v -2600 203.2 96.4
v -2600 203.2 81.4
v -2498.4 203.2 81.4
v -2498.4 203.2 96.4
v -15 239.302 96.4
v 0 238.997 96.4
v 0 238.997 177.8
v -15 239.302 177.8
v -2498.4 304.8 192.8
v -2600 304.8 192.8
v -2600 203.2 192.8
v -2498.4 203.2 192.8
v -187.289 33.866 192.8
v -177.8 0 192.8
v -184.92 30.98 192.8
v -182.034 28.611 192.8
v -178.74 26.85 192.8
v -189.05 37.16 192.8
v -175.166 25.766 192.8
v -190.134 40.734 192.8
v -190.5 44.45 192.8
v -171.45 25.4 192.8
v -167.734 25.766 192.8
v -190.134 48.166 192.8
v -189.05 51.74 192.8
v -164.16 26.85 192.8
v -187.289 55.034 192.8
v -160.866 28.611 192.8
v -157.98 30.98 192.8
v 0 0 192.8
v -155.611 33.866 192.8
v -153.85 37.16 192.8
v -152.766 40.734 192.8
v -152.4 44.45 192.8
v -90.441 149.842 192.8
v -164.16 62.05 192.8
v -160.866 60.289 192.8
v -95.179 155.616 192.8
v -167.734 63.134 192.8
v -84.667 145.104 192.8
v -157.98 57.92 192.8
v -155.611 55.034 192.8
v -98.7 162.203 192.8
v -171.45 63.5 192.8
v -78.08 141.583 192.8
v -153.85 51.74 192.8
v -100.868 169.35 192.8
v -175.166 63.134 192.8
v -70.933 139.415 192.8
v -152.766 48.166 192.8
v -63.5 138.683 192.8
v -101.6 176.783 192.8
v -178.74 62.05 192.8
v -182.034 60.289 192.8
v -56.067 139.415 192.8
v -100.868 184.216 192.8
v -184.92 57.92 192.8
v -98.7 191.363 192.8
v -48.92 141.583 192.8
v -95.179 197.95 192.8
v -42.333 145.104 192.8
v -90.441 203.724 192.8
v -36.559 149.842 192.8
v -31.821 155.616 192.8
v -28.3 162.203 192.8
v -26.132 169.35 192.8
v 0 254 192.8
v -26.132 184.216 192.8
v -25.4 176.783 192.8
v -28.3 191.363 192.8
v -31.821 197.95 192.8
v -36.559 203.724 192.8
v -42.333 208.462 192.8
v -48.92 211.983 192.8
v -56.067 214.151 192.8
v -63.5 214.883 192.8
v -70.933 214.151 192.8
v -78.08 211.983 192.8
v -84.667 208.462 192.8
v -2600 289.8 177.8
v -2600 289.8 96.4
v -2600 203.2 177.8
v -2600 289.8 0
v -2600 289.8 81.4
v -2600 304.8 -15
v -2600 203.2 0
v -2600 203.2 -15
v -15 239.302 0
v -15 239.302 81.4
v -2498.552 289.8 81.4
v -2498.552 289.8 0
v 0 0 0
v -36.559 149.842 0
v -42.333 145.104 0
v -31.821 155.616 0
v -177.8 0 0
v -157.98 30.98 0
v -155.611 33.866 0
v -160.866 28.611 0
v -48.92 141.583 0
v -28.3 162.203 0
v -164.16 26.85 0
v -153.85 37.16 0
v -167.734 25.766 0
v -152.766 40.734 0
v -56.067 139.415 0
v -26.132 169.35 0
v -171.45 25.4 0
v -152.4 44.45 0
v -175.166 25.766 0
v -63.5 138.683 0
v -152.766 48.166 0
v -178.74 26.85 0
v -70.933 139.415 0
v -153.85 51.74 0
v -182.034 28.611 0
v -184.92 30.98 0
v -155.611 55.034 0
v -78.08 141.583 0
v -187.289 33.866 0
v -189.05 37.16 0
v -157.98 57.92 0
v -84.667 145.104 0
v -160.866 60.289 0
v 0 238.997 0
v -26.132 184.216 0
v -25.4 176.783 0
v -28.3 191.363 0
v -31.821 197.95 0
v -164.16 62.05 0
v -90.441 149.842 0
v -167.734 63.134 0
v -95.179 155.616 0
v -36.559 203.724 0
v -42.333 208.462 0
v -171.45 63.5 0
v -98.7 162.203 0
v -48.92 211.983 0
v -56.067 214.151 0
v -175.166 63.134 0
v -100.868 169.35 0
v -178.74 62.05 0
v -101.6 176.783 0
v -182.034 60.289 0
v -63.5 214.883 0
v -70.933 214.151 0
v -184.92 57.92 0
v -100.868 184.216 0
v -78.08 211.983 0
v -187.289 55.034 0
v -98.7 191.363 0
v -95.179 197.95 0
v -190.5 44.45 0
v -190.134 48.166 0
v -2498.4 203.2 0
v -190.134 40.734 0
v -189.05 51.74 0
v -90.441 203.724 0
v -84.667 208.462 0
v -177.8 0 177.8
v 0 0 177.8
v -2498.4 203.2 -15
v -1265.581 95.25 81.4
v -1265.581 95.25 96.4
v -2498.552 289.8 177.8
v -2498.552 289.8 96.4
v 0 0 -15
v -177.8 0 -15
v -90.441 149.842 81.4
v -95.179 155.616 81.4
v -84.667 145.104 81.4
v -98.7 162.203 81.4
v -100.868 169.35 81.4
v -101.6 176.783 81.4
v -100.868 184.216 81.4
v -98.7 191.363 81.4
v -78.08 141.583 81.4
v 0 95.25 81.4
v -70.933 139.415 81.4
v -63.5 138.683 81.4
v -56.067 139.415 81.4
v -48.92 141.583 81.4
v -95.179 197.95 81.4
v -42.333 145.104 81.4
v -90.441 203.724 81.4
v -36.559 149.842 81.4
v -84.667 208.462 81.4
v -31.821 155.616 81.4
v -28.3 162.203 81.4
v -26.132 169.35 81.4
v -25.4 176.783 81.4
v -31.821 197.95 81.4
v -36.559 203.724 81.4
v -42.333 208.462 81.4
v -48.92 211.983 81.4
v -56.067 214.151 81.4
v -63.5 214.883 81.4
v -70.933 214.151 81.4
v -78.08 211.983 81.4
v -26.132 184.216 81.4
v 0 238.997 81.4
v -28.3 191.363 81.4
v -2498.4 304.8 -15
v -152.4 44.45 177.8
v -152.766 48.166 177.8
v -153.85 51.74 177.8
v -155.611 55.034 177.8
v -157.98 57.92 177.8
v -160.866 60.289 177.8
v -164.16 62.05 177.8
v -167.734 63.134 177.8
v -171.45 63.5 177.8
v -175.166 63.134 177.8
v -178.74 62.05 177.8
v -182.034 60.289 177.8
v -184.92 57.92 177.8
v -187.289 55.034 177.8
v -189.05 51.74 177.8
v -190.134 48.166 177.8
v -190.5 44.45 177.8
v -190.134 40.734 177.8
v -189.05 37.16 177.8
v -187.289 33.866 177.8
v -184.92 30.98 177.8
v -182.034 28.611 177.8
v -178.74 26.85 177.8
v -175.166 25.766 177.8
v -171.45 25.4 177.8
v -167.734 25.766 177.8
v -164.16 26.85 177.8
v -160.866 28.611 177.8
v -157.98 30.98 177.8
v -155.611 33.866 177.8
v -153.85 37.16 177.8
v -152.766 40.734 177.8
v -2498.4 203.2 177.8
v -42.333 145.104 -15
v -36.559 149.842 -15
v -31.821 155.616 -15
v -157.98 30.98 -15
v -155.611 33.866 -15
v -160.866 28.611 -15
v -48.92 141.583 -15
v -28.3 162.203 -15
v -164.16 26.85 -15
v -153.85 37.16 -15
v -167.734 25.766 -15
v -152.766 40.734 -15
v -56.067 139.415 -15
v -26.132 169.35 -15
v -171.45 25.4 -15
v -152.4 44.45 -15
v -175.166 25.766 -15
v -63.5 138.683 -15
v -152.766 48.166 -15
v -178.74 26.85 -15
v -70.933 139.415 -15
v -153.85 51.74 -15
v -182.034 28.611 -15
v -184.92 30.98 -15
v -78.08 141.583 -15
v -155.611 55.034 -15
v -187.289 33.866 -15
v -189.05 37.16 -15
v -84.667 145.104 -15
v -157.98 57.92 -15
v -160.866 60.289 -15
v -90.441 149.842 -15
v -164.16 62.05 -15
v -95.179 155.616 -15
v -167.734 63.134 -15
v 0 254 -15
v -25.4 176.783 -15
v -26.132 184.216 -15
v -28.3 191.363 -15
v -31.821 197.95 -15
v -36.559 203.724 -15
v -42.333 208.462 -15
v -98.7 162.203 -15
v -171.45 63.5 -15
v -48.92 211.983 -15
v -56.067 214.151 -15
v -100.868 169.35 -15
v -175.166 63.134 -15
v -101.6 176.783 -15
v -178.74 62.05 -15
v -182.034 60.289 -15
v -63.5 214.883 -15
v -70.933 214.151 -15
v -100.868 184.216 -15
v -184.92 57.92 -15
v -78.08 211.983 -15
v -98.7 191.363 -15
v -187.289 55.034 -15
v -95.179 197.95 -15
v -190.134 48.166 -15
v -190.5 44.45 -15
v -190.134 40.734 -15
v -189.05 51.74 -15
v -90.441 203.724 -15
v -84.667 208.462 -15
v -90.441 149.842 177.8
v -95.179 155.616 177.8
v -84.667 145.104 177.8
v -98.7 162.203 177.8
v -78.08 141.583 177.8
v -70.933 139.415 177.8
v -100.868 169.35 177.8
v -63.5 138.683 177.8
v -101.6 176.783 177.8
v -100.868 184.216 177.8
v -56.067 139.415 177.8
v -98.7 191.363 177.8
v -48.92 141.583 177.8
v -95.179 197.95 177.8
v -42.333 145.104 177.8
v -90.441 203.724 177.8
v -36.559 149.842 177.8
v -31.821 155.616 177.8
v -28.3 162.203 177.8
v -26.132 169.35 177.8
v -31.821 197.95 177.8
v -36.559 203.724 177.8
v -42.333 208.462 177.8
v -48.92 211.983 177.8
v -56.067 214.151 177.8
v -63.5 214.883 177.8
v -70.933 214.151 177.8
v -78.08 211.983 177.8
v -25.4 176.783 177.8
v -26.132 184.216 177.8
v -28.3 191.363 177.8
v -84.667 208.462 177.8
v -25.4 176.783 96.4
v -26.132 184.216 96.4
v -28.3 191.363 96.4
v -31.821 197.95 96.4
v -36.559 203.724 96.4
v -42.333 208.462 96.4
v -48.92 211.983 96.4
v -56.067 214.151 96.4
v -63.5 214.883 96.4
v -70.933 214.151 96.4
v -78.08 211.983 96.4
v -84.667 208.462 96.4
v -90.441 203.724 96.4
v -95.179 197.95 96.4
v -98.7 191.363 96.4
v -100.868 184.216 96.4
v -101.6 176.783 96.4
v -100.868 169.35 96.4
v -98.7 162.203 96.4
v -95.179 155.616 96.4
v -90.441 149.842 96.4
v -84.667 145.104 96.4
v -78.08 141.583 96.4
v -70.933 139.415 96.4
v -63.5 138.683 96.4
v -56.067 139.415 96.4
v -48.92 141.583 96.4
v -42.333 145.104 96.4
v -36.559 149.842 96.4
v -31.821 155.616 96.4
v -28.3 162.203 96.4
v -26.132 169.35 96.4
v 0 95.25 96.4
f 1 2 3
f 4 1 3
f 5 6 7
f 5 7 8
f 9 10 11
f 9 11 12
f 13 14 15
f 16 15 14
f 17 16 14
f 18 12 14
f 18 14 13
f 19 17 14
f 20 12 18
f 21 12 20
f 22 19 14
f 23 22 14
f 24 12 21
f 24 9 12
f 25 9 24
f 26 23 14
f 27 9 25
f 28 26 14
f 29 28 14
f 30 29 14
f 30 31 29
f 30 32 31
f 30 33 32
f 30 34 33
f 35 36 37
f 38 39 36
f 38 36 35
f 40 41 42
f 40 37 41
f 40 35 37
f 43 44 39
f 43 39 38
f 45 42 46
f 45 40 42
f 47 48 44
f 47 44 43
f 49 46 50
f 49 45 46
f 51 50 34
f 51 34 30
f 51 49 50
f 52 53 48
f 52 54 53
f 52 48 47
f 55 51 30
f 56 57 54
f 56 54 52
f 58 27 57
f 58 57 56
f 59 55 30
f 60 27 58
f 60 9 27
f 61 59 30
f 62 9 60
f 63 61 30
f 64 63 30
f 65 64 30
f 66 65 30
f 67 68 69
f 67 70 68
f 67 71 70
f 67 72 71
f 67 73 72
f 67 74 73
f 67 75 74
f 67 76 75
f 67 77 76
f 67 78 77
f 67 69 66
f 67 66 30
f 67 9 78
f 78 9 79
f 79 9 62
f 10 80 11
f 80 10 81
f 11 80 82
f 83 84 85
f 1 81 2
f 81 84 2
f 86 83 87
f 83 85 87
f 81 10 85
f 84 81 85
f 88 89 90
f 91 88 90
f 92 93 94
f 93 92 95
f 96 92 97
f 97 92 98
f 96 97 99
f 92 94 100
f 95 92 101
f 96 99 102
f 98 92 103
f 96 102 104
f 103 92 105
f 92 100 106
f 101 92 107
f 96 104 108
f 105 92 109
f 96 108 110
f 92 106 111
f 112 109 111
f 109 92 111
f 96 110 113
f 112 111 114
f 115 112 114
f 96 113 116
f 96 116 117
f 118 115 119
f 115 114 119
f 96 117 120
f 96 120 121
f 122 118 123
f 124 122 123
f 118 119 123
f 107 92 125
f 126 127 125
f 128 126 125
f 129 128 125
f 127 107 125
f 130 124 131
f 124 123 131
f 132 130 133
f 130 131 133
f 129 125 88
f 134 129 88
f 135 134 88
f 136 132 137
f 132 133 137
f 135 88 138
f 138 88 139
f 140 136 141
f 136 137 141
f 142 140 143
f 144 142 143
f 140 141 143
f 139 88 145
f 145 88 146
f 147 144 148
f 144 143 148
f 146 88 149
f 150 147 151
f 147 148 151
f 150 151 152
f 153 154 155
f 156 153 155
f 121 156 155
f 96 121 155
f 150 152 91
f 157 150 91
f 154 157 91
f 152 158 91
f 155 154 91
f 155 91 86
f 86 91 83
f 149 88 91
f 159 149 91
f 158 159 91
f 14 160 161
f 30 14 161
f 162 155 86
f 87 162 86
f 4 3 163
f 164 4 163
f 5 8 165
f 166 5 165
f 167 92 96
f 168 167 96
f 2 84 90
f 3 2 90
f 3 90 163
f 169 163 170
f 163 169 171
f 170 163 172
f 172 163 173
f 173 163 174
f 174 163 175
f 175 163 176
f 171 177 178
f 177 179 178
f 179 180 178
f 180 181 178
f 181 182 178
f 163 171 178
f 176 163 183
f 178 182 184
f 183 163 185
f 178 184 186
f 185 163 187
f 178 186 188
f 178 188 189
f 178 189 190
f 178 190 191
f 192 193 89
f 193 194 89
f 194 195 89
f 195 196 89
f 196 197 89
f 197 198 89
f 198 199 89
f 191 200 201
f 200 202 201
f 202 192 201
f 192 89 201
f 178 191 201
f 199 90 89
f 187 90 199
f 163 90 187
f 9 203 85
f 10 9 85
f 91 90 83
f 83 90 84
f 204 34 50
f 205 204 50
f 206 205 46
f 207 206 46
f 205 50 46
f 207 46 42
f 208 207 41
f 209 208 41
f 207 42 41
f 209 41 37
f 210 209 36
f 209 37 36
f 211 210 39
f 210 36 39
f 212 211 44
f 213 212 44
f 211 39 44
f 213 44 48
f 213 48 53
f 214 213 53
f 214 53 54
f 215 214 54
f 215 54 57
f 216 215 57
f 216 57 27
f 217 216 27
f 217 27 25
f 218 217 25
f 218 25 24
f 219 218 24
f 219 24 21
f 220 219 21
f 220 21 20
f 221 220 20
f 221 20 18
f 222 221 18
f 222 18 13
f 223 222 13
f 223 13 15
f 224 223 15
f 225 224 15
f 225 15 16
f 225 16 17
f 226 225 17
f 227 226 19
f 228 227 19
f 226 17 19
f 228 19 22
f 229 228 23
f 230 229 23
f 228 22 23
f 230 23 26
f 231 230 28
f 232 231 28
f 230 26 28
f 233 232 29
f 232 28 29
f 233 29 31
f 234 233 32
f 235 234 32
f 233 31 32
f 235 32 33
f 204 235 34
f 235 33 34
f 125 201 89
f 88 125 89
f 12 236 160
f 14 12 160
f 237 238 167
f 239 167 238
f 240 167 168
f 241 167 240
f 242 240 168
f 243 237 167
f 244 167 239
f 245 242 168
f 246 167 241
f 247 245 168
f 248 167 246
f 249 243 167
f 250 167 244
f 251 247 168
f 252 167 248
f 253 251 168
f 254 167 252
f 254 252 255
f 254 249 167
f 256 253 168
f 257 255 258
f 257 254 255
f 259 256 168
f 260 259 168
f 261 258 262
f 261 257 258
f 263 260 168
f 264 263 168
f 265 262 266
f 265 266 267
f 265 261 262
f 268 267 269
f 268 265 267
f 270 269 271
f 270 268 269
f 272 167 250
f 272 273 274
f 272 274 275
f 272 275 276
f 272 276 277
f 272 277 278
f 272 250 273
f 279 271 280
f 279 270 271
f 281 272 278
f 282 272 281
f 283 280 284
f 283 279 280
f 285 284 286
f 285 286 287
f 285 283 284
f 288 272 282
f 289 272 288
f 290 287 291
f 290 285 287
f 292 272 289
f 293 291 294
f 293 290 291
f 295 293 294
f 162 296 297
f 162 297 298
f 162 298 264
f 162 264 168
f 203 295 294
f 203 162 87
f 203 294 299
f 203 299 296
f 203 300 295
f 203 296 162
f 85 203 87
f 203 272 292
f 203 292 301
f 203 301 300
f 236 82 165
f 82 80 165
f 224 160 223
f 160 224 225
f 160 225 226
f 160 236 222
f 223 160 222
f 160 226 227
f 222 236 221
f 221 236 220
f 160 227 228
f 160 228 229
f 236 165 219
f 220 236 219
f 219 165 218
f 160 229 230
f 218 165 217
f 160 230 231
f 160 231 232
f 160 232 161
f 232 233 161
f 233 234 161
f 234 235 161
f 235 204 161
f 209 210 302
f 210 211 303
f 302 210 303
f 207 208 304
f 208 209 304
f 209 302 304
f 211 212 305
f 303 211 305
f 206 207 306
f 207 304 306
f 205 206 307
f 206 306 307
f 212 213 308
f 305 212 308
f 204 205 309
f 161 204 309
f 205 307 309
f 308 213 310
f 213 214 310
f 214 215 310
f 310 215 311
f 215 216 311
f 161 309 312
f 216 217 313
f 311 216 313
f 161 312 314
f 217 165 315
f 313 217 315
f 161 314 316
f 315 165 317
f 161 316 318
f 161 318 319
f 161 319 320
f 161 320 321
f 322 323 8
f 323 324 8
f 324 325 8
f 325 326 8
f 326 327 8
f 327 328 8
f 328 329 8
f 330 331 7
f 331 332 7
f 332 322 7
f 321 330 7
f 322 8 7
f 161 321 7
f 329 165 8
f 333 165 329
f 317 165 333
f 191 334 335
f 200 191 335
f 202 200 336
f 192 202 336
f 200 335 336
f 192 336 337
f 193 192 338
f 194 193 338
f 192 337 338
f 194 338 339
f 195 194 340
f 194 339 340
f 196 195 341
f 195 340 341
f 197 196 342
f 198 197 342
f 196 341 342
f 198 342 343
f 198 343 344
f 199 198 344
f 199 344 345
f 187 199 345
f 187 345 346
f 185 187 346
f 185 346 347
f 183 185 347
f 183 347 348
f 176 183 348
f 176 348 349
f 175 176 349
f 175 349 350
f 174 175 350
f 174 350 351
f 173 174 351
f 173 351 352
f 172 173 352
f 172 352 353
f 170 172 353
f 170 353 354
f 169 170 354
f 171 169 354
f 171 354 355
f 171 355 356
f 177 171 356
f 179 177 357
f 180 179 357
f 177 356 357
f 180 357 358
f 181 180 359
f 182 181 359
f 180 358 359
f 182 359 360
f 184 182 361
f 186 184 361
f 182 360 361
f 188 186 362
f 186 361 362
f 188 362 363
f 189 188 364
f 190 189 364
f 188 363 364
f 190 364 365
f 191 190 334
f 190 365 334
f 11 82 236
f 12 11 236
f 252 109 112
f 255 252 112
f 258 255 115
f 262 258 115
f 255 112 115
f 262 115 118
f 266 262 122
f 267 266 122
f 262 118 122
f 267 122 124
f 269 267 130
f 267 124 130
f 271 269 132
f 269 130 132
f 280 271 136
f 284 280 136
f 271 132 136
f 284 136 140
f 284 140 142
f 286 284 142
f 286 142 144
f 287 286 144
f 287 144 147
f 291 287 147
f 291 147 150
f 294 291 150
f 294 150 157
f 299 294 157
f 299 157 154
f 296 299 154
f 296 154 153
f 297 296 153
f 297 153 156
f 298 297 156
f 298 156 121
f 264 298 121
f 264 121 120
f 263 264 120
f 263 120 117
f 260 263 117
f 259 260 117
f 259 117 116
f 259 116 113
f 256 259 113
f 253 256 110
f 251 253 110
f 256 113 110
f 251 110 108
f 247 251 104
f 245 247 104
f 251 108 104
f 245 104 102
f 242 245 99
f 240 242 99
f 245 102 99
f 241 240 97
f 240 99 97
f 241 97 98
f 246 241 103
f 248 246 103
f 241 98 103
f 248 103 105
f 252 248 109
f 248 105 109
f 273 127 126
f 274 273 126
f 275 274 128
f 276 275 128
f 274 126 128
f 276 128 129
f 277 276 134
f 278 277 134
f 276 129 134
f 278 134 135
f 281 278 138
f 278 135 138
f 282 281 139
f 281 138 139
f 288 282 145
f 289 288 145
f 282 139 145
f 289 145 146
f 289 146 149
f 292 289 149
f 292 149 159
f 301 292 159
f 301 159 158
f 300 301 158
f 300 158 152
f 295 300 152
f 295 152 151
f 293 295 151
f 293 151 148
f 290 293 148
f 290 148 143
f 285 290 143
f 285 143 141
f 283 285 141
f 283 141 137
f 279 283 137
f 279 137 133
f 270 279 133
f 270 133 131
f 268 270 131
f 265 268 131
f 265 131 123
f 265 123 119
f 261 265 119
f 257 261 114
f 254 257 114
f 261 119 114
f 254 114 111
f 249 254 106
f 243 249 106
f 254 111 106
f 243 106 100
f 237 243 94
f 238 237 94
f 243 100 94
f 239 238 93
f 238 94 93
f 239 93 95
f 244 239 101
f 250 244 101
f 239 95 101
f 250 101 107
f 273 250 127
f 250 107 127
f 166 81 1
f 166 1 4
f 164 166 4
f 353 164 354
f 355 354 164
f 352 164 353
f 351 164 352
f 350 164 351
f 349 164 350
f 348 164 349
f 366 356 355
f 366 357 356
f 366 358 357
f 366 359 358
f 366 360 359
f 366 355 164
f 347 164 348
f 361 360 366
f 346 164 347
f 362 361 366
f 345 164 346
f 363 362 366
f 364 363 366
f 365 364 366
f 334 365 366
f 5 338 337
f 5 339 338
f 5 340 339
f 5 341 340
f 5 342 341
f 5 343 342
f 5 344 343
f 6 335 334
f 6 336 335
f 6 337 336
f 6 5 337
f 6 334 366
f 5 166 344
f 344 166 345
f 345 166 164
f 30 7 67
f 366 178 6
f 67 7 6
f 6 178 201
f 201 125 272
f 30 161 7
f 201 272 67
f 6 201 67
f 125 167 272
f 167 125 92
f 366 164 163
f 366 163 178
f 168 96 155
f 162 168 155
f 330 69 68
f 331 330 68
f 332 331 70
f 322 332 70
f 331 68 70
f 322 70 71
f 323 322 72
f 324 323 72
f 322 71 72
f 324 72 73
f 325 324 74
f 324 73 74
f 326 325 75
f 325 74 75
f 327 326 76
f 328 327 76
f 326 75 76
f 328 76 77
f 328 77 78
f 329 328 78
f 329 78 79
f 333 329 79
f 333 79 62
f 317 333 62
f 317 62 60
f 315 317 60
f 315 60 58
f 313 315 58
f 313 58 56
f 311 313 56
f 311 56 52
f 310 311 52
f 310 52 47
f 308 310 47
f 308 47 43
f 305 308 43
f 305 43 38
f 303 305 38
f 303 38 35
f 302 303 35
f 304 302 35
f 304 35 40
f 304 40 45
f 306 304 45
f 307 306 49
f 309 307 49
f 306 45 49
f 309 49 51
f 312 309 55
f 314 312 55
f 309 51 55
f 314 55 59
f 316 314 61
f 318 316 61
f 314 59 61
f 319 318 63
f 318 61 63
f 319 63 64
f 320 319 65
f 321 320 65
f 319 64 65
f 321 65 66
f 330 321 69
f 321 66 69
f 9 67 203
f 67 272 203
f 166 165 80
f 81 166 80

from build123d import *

# Parameters (mm, degrees)
BOSS_EXTRUDE1_DEPTH      = 15
BOSS_EXTRUDE2_DEPTH      = 15
BOSS_EXTRUDE3_DEPTH      = 192.8
BOSS_EXTRUDE4_DEPTH      = 7.5
BOSS_EXTRUDE4_DEPTH_BACK = 7.5
SKETCH5_R                = 38.1
SKETCH5_R_2              = 19.05
CUT_EXTRUDE1_DEPTH       = 2627.039580814
CUT_EXTRUDE2_DEPTH       = 15


with BuildPart() as part:
    # Sketch1 → Boss-Extrude1 (new body)
    with BuildSketch(Plane.XY):
        Polygon((-2600, 304.8), (-2498.4, 304.8), (0, 254), (0, 0), (-177.8, 0), (-2498.4, 203.2), (-2600, 203.2), align=None)
    extrude(amount=-BOSS_EXTRUDE1_DEPTH)



with BuildPart() as body_2:
    # Sketch2 → Boss-Extrude2 (new body)
    with BuildSketch(Plane.XY.offset(177.8)):
        Polygon((-2498.4, 203.2), (-177.8, 0), (0, 0), (0, 254), (-2498.4, 304.8), (-2600, 304.8), (-2600, 203.2), align=None)
    extrude(amount=BOSS_EXTRUDE2_DEPTH)


with BuildPart() as part_1:
    add(part.part)

    add(body_2.part)  # Boss-Extrude3 merges body 2
    # Sketch3 → Boss-Extrude3 (add)
    with BuildSketch(Plane.XY.offset(192.8)):
        Polygon((-2600, 289.8), (-2600, 304.8), (-2498.4, 304.8), (0, 254), (0, 238.996899585), (-15, 239.301894782), (-2498.55248184, 289.8), align=None)
    extrude(amount=-BOSS_EXTRUDE3_DEPTH)

    # Sketch6 → Boss-Extrude4 (add, two sides: drawn at the far end of the back side and taken through both)
    with BuildSketch(Plane.XY.offset(88.9).offset(-BOSS_EXTRUDE4_DEPTH_BACK)):
        Polygon((-2498.4, 203.2), (-177.8, 0), (0, 0), (0, 254), (-2498.4, 304.8), (-2600, 304.8), (-2600, 203.2), align=None)
    extrude(amount=BOSS_EXTRUDE4_DEPTH + BOSS_EXTRUDE4_DEPTH_BACK)

    # Sketch5 → Cut-Extrude1 (cut, through all)
    with BuildSketch(Plane.XY.offset(192.8)):
        with Locations((-63.5, 176.782795882)):
            Circle(SKETCH5_R)
        with Locations((-171.45, 44.45)):
            Circle(SKETCH5_R_2)
    extrude(amount=-CUT_EXTRUDE1_DEPTH, mode=Mode.SUBTRACT)

    # Sketch7 → Cut-Extrude2 (cut)
    with BuildSketch(Plane.XY.offset(96.4)):
        Polygon((-1265.58125, 95.25), (0, 95.25), (0, 0), (-177.8, 0), align=None)
    extrude(amount=-CUT_EXTRUDE2_DEPTH, mode=Mode.SUBTRACT)


solid = part_1.part
